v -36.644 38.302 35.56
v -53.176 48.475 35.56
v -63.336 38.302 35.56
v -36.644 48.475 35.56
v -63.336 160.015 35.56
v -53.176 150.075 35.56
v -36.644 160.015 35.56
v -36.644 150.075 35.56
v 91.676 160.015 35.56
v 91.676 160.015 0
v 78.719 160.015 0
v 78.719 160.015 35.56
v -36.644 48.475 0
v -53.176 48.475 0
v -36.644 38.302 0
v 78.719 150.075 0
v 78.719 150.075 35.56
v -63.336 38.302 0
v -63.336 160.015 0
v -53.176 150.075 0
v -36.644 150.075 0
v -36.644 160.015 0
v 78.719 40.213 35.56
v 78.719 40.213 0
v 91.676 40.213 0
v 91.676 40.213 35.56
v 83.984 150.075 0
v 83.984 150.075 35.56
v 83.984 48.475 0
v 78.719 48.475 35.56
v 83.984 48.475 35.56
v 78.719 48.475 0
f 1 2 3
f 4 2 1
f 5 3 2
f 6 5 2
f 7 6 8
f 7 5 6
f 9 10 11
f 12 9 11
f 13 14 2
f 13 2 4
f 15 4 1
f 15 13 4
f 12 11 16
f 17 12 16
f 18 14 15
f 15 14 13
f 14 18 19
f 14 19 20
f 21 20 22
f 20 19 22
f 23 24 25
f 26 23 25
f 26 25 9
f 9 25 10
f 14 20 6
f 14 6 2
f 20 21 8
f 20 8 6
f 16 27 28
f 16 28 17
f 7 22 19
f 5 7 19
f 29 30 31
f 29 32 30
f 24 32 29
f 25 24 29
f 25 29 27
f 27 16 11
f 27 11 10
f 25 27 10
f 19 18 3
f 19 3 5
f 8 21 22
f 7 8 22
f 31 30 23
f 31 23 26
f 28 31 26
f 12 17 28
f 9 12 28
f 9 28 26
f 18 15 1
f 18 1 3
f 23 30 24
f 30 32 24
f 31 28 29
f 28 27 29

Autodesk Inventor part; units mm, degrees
ref_plane "YZ Plane" through (0, 0, 0) normal (1, 0, 0) x (0, 1, 0)
ref_plane "XZ Plane" through (0, 0, 0) normal (0, 1, 0) x (-1, 0, 0)
ref_plane "XY Plane" through (0, 0, 0) normal (0, 0, 1) x (1, 0, 0)
sketch "Sketch1" plane through (0, 0, 0) normal (0, 0, 1) x (1, 0, 0)
  line L0 (-53.1764, 61.1751) -> (-53.1764, 48.4751) projected
  line L1 (-53.1764, 48.4751) -> (83.9836, 48.4751) projected
  line L2 (-53.1764, 150.0751) -> (-53.1764, 137.3751) projected
  line L3 (83.9836, 150.0751) -> (-53.1764, 150.0751) projected
  line L4 (-53.1764, 61.1751) -> (-53.1764, 48.4751)
  line L5 (-53.1764, 61.1751) -> (-53.1764, 79.1879)
  line L6 (-36.6444, 48.4751) -> (-36.6444, 38.302)
  line L7 (-36.6444, 38.302) -> (-63.3364, 38.302)
  line L8 (-63.3364, 38.302) -> (-63.3364, 79.1879)
  line L9 (83.9836, 150.0751) -> (83.9836, 48.4751)
  line L10 (78.719, 48.4751) -> (78.719, 40.2129)
  line L11 (78.719, 40.2129) -> (91.6764, 40.2129)
  line L12 (91.6764, 40.2129) -> (91.6764, 160.0146)
  line L13 (91.6764, 160.0146) -> (78.719, 160.0146)
  line L14 (78.719, 160.0146) -> (78.719, 150.0751)
  line L15 (83.9836, 150.0751) -> (78.719, 150.0751)
  line L16 (-53.1764, 79.1879) -> (-53.1764, 150.0751)
  line L17 (-36.6444, 150.0751) -> (-36.6444, 160.0146)
  line L18 (-36.6444, 160.0146) -> (-63.3364, 160.0146)
  line L19 (-63.3364, 160.0146) -> (-63.3364, 79.1879)
  point P0 (0, 0)
  dimension "d0" = 10.16
extrude "Extrusion1" add sketch "Sketch1" along normal blind 35.56 contours L0 L1 L6 L7 L8 L19 L18 L17 L3 L2 L16 L5 | L1 L9 L3 L14 L13 L12 L11 L10
properties part number "pitop hold"
